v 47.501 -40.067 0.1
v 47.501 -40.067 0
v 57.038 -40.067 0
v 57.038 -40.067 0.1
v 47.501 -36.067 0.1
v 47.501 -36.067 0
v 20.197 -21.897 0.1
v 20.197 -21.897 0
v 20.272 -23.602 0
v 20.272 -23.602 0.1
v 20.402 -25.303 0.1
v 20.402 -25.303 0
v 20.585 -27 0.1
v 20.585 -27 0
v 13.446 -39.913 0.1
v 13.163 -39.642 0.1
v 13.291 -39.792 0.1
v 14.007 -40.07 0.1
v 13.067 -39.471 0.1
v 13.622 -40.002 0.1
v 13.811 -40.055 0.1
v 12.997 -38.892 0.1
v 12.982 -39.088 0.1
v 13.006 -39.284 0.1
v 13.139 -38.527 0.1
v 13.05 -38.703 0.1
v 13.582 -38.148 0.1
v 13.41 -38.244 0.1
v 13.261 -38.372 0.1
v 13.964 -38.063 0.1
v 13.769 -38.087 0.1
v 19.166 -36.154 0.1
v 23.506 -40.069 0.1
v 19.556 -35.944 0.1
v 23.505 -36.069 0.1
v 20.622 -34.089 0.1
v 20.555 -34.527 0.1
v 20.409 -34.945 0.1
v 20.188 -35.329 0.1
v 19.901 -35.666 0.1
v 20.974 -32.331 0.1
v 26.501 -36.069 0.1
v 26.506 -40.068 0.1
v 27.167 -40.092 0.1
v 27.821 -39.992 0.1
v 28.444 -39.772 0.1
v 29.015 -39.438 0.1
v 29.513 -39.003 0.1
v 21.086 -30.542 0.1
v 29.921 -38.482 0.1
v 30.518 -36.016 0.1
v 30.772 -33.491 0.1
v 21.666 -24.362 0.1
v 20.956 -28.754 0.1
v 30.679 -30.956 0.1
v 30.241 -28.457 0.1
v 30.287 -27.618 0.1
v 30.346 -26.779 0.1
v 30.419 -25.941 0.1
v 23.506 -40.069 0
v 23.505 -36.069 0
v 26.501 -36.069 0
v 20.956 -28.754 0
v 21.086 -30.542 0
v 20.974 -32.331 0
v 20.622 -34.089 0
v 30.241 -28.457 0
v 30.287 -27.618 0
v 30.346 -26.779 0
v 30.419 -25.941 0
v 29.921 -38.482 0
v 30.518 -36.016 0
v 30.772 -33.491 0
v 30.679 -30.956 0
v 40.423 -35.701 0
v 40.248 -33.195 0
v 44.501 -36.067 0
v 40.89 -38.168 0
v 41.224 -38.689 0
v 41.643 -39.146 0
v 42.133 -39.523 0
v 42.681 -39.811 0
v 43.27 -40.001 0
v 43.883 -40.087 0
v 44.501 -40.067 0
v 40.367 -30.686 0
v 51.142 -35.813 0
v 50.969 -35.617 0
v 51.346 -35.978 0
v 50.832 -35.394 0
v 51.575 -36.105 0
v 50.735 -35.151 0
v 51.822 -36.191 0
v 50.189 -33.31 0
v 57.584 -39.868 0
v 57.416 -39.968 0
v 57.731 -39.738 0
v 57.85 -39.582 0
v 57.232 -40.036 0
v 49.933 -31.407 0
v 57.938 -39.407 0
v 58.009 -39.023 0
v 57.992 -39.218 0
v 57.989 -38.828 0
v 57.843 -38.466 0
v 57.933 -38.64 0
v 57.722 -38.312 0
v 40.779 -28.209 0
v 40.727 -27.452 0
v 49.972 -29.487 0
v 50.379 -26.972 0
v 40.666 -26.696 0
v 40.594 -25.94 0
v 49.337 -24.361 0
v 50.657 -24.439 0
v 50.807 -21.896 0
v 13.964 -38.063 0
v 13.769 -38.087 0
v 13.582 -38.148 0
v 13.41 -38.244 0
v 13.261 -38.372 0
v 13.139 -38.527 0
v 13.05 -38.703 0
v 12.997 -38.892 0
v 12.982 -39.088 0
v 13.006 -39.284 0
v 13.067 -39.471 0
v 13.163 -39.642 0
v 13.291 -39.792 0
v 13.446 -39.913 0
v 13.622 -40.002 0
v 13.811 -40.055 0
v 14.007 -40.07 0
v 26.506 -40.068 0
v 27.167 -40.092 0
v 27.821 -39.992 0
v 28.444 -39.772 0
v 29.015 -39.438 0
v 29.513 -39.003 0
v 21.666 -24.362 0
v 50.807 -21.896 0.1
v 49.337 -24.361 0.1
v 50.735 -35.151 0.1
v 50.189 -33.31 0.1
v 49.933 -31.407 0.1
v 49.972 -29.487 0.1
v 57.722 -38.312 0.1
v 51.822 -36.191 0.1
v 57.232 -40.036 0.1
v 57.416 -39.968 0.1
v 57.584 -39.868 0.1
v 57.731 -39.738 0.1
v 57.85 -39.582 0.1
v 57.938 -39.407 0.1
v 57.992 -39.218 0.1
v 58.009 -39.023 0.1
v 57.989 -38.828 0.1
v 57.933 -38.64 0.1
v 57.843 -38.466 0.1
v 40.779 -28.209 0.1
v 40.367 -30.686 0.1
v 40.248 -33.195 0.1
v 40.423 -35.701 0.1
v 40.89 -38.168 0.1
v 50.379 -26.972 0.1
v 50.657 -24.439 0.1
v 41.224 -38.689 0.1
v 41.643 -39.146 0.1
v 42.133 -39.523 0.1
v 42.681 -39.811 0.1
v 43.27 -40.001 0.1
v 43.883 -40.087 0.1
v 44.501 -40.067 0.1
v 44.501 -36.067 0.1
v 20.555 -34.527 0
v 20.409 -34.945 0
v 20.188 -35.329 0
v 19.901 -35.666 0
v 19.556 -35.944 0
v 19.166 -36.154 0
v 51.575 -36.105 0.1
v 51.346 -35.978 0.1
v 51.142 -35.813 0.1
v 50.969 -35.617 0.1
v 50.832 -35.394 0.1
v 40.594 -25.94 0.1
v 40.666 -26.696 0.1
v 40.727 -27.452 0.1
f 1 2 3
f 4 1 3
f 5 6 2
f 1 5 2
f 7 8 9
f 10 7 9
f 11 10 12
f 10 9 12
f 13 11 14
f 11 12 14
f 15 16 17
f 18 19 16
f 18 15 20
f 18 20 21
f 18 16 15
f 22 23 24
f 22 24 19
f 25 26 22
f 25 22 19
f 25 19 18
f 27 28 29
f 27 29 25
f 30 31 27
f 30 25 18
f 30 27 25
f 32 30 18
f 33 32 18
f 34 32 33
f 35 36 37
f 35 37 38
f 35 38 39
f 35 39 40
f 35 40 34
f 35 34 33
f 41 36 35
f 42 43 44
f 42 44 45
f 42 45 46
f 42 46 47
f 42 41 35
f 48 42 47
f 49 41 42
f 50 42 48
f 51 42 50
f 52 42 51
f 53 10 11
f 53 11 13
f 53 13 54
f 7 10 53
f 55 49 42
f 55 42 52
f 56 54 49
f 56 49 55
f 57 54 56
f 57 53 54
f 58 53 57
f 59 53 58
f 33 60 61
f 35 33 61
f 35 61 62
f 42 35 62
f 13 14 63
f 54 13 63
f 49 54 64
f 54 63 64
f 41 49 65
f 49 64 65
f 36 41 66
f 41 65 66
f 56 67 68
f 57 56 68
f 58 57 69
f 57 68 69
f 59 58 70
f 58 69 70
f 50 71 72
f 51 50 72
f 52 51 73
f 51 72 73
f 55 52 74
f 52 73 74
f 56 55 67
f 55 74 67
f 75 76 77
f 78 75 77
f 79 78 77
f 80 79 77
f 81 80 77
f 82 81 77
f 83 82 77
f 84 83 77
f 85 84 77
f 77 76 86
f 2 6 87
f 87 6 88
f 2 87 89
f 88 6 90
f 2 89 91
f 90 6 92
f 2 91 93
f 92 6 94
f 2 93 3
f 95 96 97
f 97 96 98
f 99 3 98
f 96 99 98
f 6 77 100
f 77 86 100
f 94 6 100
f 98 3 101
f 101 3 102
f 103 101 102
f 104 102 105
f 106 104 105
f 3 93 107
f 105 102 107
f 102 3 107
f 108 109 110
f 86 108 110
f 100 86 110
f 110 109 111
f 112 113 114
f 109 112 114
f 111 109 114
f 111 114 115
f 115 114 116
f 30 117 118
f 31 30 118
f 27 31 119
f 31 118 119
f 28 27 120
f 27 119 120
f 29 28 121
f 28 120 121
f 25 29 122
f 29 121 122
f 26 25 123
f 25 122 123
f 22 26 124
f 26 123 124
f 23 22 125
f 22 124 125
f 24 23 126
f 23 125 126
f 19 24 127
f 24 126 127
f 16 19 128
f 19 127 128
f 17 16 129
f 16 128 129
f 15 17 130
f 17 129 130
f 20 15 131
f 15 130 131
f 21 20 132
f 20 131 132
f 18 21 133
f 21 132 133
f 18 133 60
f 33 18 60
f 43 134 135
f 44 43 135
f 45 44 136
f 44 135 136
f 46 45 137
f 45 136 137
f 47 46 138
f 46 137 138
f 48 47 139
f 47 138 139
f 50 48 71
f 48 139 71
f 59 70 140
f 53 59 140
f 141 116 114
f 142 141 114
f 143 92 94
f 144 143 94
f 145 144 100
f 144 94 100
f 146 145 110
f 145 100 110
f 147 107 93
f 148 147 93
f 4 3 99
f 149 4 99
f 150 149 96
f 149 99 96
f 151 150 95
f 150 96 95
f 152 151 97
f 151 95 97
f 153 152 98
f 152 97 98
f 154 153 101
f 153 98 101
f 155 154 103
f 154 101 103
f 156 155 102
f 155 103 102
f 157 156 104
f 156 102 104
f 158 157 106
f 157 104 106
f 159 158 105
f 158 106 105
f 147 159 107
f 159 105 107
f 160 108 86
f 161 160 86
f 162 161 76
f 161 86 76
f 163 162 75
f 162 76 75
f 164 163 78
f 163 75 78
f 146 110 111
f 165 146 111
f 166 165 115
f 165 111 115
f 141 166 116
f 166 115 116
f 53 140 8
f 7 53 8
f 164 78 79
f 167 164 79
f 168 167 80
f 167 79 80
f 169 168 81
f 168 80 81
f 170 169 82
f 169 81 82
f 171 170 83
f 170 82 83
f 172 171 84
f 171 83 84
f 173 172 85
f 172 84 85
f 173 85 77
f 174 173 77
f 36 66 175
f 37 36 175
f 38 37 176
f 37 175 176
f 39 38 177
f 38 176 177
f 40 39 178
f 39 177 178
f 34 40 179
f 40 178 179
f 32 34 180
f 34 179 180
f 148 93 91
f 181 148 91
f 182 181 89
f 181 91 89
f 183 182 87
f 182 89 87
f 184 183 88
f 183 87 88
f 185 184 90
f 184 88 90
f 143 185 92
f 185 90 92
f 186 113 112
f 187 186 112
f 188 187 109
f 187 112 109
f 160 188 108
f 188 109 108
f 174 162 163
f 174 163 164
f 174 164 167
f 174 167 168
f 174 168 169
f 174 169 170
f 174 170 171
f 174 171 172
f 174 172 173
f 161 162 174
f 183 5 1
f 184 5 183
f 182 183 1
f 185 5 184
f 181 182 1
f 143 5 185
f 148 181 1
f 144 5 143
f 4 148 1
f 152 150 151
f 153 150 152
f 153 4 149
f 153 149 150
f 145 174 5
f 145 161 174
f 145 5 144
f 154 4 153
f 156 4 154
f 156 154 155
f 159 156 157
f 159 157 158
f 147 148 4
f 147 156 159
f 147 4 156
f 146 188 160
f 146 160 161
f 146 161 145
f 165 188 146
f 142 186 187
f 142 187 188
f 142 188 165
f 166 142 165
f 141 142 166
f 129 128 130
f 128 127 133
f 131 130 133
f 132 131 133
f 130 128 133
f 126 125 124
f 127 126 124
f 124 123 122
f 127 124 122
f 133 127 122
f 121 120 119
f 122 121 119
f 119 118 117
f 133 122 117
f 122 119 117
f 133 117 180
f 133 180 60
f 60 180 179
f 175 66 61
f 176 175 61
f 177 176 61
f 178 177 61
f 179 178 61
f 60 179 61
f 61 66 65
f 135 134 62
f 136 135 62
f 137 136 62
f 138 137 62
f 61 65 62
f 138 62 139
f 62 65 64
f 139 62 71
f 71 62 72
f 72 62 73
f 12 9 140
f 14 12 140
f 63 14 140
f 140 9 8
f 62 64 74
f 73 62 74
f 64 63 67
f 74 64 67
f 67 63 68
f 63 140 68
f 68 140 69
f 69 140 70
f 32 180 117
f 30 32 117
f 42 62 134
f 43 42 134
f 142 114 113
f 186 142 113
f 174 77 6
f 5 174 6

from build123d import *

# Parameters (mm, degrees)
SALIENTE_EXTRUIR1_DEPTH   = 0.1
SALIENTE_EXTRUIR1_2_DEPTH = 0.1


with BuildPart() as part:
    # Model → Saliente-Extruir1 (new body)
    with BuildSketch(Plane.XY):
        with BuildLine():
            Line((26.501269255, -36.068605041), (26.506051465, -40.067662259))
            ThreePointArc((26.506051465, -40.067662259), (28.444344017, -39.771690142), (29.920969094, -38.481668478))
            ThreePointArc((29.920969094, -38.481668478), (30.772348929, -33.491466373), (30.240780395, -28.457144218))
            ThreePointArc((30.240780395, -28.457144218), (30.31487768, -27.198260074), (30.418644104, -25.941473607))
            Line((30.418644104, -25.941473607), (21.66634164, -24.362151891))
            Line((21.66634164, -24.362151891), (20.196850226, -21.897303534))
            ThreePointArc((20.196850226, -21.897303534), (20.330431924, -24.452991033), (20.584617406, -26.999512662))
            ThreePointArc((20.584617406, -26.999512662), (21.086332443, -30.541981177), (20.621577326, -34.089487885))
            ThreePointArc((20.621577326, -34.089487885), (20.188232636, -35.329342735), (19.166265945, -36.154334707))
            Line((19.166265945, -36.154334707), (13.964095848, -38.063123051))
            ThreePointArc((13.964095848, -38.063123051), (12.982047294, -39.088384952), (14.007309194, -40.070433507))
            Line((14.007309194, -40.070433507), (23.506051635, -40.069043418))
            Line((23.506051635, -40.069043418), (23.505466257, -36.06904346))
            Line((23.505466257, -36.06904346), (26.501269255, -36.068605041))
        make_face()
    extrude(amount=SALIENTE_EXTRUIR1_DEPTH)


with BuildPart() as body_2:
    # Model → Saliente-Extruir1 2 (new body)
    with BuildSketch(Plane.XY):
        with BuildLine():
            Line((57.721521483, -38.312071296), (51.822198996, -36.191325411))
            ThreePointArc((51.822198996, -36.191325411), (51.142357203, -35.813382317), (50.735279518, -35.15057495))
            ThreePointArc((50.735279518, -35.15057495), (50.024494027, -32.363382375), (49.971915497, -29.48746618))
            ThreePointArc((49.971915497, -29.48746618), (50.534229917, -25.707596933), (50.80661247, -21.895849724))
            Line((50.80661247, -21.895849724), (49.337355198, -24.360837656))
            Line((49.337355198, -24.360837656), (40.594249402, -25.940135422))
            ThreePointArc((40.594249402, -25.940135422), (40.697813422, -27.073621681), (40.779232989, -28.208913477))
            ThreePointArc((40.779232989, -28.208913477), (40.248038009, -33.195193817), (40.890317085, -38.168385683))
            ThreePointArc((40.890317085, -38.168385683), (42.400635208, -39.679109073), (44.501269255, -40.067287633))
            Line((44.501269255, -40.067287633), (44.501269255, -36.067287633))
            Line((44.501269255, -36.067287633), (47.501269255, -36.067287633))
            Line((47.501269255, -36.067287633), (47.501269255, -40.067287633))
            Line((47.501269255, -40.067287633), (57.03827443, -40.066886334))
            ThreePointArc((57.03827443, -40.066886334), (57.938175953, -39.406847476), (57.721521483, -38.312071296))
        make_face()
    extrude(amount=SALIENTE_EXTRUIR1_2_DEPTH)


solid = Compound([part.part, body_2.part])
